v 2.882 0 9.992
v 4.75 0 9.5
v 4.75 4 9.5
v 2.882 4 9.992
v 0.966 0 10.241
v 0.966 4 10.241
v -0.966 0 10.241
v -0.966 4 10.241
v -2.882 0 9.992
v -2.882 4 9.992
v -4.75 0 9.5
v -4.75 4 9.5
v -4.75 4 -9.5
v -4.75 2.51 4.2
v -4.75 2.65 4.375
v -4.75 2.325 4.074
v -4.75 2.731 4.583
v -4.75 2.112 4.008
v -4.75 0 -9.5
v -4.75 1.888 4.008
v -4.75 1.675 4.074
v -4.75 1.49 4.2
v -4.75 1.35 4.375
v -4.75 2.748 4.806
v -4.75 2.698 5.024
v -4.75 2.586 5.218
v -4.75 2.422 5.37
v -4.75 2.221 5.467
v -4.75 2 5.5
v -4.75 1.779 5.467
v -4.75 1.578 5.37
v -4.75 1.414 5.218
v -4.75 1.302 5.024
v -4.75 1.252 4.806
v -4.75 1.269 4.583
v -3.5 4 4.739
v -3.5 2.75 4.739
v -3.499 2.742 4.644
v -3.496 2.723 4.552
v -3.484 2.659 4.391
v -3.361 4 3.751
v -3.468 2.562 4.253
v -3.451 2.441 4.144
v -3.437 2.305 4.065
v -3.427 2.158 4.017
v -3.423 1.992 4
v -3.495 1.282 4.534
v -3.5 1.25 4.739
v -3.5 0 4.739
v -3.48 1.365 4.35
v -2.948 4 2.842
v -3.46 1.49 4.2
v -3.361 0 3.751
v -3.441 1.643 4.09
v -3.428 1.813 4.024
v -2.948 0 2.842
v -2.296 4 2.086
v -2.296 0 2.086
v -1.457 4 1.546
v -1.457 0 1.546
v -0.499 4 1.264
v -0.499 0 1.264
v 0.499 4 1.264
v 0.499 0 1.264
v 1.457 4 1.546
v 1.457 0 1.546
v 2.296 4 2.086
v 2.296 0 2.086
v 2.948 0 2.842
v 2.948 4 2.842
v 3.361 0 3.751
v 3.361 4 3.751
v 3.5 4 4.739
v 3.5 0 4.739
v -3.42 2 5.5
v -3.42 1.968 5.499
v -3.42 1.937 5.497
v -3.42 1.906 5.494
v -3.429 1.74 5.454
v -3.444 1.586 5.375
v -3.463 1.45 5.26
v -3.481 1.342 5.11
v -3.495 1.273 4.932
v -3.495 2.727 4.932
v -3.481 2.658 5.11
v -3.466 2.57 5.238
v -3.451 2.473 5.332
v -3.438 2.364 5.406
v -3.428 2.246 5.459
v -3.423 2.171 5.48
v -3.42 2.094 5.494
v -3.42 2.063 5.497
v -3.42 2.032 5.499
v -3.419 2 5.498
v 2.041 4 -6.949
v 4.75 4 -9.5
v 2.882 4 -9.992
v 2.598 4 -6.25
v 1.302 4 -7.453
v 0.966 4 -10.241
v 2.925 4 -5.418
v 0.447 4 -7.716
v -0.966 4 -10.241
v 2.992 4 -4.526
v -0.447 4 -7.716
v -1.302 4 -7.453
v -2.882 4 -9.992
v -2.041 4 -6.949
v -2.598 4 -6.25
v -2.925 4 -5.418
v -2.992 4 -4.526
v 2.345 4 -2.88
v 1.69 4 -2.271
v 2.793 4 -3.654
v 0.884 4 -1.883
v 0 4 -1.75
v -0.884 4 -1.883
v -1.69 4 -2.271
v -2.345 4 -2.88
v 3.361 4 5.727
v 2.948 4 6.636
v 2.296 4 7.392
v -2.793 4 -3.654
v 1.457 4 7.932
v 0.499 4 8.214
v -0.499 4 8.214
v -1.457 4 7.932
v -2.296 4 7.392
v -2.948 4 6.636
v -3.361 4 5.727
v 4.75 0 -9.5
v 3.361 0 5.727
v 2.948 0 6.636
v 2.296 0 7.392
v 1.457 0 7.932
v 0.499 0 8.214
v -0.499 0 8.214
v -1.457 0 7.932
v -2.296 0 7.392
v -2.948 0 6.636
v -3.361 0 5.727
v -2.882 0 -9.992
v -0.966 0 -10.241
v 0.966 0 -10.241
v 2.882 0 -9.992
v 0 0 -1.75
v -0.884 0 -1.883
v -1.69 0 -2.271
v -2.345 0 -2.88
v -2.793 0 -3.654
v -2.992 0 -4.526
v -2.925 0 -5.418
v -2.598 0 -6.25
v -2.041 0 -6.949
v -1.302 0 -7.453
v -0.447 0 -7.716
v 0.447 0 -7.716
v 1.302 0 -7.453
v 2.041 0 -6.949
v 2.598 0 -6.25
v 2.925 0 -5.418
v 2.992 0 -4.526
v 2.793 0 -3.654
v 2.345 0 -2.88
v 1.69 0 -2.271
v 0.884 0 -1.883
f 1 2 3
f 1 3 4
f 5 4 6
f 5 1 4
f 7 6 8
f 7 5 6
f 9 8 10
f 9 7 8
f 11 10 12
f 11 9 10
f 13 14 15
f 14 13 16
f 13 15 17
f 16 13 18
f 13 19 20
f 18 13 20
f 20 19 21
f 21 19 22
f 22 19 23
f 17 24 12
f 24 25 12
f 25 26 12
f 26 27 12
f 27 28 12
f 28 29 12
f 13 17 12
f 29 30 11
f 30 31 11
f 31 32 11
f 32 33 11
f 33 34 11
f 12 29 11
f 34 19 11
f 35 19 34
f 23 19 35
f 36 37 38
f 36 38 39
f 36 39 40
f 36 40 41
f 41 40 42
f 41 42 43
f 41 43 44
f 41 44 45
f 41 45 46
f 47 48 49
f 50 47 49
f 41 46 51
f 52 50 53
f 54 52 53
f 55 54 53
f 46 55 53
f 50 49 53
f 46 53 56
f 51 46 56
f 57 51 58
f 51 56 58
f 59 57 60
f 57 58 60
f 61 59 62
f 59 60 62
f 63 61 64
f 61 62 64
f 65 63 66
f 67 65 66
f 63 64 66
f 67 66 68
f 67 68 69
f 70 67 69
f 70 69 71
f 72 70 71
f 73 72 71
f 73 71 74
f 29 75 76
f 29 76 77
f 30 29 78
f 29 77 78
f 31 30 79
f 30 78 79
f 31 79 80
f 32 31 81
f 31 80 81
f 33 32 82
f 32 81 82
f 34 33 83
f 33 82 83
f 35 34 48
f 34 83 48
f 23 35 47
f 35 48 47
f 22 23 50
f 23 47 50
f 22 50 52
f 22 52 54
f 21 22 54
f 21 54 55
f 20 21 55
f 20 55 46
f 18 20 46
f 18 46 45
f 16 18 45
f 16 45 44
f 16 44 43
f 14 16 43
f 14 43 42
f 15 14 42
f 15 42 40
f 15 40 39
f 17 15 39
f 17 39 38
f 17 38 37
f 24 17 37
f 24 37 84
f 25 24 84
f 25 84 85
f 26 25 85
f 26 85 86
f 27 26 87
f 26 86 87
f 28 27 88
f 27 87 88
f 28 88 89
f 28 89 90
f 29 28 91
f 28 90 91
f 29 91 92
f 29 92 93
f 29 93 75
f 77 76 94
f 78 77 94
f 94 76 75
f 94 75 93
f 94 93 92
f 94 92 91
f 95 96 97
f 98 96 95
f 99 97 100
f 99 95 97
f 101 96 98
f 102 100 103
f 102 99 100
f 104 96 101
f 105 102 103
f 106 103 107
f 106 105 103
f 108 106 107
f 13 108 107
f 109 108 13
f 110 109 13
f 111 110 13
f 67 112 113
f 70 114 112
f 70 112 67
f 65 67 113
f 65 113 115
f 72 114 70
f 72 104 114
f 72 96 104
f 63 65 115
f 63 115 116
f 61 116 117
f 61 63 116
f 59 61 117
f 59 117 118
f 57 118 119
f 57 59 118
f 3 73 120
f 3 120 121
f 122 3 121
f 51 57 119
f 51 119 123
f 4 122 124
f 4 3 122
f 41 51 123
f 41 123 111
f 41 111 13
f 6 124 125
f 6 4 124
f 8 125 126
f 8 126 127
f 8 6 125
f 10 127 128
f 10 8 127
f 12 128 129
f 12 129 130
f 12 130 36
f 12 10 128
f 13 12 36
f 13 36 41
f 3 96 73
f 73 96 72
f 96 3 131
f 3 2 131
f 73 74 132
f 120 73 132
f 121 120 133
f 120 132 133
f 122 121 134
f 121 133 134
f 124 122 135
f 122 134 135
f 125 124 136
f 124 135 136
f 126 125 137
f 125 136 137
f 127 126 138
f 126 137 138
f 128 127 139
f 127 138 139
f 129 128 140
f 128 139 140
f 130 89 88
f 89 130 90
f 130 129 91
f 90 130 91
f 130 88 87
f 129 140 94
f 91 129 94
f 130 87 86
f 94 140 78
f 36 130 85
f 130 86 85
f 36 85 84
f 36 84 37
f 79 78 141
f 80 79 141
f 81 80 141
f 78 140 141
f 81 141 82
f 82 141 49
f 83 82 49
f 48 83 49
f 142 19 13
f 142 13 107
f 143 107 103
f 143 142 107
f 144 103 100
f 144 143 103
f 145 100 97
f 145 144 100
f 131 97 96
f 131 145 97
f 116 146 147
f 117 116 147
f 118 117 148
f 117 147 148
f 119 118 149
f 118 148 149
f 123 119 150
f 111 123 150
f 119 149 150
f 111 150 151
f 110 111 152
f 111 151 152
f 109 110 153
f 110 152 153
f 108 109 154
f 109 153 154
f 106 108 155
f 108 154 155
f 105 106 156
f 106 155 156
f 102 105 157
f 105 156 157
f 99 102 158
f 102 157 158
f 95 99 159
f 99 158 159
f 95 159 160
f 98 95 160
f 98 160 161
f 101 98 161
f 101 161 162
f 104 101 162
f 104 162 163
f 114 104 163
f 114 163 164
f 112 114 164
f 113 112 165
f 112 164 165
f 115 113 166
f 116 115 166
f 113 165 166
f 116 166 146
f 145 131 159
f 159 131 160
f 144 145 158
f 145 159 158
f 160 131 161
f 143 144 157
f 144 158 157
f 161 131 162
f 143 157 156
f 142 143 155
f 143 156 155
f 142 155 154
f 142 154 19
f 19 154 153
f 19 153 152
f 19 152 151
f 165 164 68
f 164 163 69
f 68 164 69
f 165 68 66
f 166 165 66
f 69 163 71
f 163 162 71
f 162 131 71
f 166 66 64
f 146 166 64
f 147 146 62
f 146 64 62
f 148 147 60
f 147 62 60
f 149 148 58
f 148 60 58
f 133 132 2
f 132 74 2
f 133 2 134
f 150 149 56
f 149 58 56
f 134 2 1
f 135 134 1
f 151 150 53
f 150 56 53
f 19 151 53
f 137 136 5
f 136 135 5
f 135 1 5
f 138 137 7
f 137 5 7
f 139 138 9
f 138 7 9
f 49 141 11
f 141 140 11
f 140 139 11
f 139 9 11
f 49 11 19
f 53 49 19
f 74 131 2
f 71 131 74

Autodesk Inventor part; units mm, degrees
ref_plane "YZ Plane" through (0, 0, 0) normal (1, 0, 0) x (0, 1, 0)
ref_plane "XZ Plane" through (0, 0, 0) normal (0, 1, 0) x (-1, 0, 0)
ref_plane "XY Plane" through (0, 0, 0) normal (0, 0, 1) x (1, 0, 0)
sketch "Sketch1" plane through (0, 0, 0) normal (0, 1, 0) x (-1, 0, 0)
  line L0 (4.75, 9.5) -> (-4.75, 9.5)
  line L1 (-4.75, 9.5) -> (-4.75, -9.5)
  line L2 (-4.75, -9.5) -> (4.75, -9.5)
  line L3 (4.75, -9.5) -> (4.75, 9.5)
  line L4 (4.75, 9.5) -> (-4.75, -9.5) construction
  line L5 (-4.75, 9.5) -> (4.75, -9.5) construction
  arc A0 (-4.75, -9.5) -> (4.75, -9.5) centre (0, 4.7281) ccw
  arc A1 (4.75, 9.5) -> (-4.75, 9.5) centre (0, -4.7281) ccw
  point P0 (0, 0)
  dimension "d0" = 9.5
  dimension "d1" = 19
  dimension "d2" = 15
  dimension "d3" = 15
extrude "Extrusion1" add sketch "Sketch1" along normal blind 4
sketch "Sketch2" plane through (0, 4, 0) normal (0, 1, 0) x (1, 0, 0)
  arc A0 (4.75, 9.5) -> (-4.75, 9.5) centre (0, -4.7281) ccw projected
  point P0 (0, 0)
  point P1 (0, 4.75)
  point P2 (0, -4.75)
  dimension "d6" = 4.75
  dimension "d7" = 9.5
hole "Hole1" at (0, 4, -4.75) direction (0, -1, 0) diameter 6 end through all
hole "Hole2" at (0, 4, 4.75) at (0, 4, 4.7281) direction (0, -1, 0) diameter 7 end through all
sketch "Sketch3" plane through (-4.75, 0, -9.5) normal (-1, 0, 0) x (0, 0, 1)
  line L0 (19, 0) -> (19, 4) projected
  line L1 (0, 4) -> (19, 4) projected
  point P0 (9.5, 0)
  point P1 (14.25, 2)
  dimension "d22" = 4.75
  dimension "d23" = 2
hole "Hole3" at (-4.75, 2, 4.75) direction (1, 0, 0) diameter 1.5 depth 1.33 tip angle 118
properties material "Steel, Mild"
